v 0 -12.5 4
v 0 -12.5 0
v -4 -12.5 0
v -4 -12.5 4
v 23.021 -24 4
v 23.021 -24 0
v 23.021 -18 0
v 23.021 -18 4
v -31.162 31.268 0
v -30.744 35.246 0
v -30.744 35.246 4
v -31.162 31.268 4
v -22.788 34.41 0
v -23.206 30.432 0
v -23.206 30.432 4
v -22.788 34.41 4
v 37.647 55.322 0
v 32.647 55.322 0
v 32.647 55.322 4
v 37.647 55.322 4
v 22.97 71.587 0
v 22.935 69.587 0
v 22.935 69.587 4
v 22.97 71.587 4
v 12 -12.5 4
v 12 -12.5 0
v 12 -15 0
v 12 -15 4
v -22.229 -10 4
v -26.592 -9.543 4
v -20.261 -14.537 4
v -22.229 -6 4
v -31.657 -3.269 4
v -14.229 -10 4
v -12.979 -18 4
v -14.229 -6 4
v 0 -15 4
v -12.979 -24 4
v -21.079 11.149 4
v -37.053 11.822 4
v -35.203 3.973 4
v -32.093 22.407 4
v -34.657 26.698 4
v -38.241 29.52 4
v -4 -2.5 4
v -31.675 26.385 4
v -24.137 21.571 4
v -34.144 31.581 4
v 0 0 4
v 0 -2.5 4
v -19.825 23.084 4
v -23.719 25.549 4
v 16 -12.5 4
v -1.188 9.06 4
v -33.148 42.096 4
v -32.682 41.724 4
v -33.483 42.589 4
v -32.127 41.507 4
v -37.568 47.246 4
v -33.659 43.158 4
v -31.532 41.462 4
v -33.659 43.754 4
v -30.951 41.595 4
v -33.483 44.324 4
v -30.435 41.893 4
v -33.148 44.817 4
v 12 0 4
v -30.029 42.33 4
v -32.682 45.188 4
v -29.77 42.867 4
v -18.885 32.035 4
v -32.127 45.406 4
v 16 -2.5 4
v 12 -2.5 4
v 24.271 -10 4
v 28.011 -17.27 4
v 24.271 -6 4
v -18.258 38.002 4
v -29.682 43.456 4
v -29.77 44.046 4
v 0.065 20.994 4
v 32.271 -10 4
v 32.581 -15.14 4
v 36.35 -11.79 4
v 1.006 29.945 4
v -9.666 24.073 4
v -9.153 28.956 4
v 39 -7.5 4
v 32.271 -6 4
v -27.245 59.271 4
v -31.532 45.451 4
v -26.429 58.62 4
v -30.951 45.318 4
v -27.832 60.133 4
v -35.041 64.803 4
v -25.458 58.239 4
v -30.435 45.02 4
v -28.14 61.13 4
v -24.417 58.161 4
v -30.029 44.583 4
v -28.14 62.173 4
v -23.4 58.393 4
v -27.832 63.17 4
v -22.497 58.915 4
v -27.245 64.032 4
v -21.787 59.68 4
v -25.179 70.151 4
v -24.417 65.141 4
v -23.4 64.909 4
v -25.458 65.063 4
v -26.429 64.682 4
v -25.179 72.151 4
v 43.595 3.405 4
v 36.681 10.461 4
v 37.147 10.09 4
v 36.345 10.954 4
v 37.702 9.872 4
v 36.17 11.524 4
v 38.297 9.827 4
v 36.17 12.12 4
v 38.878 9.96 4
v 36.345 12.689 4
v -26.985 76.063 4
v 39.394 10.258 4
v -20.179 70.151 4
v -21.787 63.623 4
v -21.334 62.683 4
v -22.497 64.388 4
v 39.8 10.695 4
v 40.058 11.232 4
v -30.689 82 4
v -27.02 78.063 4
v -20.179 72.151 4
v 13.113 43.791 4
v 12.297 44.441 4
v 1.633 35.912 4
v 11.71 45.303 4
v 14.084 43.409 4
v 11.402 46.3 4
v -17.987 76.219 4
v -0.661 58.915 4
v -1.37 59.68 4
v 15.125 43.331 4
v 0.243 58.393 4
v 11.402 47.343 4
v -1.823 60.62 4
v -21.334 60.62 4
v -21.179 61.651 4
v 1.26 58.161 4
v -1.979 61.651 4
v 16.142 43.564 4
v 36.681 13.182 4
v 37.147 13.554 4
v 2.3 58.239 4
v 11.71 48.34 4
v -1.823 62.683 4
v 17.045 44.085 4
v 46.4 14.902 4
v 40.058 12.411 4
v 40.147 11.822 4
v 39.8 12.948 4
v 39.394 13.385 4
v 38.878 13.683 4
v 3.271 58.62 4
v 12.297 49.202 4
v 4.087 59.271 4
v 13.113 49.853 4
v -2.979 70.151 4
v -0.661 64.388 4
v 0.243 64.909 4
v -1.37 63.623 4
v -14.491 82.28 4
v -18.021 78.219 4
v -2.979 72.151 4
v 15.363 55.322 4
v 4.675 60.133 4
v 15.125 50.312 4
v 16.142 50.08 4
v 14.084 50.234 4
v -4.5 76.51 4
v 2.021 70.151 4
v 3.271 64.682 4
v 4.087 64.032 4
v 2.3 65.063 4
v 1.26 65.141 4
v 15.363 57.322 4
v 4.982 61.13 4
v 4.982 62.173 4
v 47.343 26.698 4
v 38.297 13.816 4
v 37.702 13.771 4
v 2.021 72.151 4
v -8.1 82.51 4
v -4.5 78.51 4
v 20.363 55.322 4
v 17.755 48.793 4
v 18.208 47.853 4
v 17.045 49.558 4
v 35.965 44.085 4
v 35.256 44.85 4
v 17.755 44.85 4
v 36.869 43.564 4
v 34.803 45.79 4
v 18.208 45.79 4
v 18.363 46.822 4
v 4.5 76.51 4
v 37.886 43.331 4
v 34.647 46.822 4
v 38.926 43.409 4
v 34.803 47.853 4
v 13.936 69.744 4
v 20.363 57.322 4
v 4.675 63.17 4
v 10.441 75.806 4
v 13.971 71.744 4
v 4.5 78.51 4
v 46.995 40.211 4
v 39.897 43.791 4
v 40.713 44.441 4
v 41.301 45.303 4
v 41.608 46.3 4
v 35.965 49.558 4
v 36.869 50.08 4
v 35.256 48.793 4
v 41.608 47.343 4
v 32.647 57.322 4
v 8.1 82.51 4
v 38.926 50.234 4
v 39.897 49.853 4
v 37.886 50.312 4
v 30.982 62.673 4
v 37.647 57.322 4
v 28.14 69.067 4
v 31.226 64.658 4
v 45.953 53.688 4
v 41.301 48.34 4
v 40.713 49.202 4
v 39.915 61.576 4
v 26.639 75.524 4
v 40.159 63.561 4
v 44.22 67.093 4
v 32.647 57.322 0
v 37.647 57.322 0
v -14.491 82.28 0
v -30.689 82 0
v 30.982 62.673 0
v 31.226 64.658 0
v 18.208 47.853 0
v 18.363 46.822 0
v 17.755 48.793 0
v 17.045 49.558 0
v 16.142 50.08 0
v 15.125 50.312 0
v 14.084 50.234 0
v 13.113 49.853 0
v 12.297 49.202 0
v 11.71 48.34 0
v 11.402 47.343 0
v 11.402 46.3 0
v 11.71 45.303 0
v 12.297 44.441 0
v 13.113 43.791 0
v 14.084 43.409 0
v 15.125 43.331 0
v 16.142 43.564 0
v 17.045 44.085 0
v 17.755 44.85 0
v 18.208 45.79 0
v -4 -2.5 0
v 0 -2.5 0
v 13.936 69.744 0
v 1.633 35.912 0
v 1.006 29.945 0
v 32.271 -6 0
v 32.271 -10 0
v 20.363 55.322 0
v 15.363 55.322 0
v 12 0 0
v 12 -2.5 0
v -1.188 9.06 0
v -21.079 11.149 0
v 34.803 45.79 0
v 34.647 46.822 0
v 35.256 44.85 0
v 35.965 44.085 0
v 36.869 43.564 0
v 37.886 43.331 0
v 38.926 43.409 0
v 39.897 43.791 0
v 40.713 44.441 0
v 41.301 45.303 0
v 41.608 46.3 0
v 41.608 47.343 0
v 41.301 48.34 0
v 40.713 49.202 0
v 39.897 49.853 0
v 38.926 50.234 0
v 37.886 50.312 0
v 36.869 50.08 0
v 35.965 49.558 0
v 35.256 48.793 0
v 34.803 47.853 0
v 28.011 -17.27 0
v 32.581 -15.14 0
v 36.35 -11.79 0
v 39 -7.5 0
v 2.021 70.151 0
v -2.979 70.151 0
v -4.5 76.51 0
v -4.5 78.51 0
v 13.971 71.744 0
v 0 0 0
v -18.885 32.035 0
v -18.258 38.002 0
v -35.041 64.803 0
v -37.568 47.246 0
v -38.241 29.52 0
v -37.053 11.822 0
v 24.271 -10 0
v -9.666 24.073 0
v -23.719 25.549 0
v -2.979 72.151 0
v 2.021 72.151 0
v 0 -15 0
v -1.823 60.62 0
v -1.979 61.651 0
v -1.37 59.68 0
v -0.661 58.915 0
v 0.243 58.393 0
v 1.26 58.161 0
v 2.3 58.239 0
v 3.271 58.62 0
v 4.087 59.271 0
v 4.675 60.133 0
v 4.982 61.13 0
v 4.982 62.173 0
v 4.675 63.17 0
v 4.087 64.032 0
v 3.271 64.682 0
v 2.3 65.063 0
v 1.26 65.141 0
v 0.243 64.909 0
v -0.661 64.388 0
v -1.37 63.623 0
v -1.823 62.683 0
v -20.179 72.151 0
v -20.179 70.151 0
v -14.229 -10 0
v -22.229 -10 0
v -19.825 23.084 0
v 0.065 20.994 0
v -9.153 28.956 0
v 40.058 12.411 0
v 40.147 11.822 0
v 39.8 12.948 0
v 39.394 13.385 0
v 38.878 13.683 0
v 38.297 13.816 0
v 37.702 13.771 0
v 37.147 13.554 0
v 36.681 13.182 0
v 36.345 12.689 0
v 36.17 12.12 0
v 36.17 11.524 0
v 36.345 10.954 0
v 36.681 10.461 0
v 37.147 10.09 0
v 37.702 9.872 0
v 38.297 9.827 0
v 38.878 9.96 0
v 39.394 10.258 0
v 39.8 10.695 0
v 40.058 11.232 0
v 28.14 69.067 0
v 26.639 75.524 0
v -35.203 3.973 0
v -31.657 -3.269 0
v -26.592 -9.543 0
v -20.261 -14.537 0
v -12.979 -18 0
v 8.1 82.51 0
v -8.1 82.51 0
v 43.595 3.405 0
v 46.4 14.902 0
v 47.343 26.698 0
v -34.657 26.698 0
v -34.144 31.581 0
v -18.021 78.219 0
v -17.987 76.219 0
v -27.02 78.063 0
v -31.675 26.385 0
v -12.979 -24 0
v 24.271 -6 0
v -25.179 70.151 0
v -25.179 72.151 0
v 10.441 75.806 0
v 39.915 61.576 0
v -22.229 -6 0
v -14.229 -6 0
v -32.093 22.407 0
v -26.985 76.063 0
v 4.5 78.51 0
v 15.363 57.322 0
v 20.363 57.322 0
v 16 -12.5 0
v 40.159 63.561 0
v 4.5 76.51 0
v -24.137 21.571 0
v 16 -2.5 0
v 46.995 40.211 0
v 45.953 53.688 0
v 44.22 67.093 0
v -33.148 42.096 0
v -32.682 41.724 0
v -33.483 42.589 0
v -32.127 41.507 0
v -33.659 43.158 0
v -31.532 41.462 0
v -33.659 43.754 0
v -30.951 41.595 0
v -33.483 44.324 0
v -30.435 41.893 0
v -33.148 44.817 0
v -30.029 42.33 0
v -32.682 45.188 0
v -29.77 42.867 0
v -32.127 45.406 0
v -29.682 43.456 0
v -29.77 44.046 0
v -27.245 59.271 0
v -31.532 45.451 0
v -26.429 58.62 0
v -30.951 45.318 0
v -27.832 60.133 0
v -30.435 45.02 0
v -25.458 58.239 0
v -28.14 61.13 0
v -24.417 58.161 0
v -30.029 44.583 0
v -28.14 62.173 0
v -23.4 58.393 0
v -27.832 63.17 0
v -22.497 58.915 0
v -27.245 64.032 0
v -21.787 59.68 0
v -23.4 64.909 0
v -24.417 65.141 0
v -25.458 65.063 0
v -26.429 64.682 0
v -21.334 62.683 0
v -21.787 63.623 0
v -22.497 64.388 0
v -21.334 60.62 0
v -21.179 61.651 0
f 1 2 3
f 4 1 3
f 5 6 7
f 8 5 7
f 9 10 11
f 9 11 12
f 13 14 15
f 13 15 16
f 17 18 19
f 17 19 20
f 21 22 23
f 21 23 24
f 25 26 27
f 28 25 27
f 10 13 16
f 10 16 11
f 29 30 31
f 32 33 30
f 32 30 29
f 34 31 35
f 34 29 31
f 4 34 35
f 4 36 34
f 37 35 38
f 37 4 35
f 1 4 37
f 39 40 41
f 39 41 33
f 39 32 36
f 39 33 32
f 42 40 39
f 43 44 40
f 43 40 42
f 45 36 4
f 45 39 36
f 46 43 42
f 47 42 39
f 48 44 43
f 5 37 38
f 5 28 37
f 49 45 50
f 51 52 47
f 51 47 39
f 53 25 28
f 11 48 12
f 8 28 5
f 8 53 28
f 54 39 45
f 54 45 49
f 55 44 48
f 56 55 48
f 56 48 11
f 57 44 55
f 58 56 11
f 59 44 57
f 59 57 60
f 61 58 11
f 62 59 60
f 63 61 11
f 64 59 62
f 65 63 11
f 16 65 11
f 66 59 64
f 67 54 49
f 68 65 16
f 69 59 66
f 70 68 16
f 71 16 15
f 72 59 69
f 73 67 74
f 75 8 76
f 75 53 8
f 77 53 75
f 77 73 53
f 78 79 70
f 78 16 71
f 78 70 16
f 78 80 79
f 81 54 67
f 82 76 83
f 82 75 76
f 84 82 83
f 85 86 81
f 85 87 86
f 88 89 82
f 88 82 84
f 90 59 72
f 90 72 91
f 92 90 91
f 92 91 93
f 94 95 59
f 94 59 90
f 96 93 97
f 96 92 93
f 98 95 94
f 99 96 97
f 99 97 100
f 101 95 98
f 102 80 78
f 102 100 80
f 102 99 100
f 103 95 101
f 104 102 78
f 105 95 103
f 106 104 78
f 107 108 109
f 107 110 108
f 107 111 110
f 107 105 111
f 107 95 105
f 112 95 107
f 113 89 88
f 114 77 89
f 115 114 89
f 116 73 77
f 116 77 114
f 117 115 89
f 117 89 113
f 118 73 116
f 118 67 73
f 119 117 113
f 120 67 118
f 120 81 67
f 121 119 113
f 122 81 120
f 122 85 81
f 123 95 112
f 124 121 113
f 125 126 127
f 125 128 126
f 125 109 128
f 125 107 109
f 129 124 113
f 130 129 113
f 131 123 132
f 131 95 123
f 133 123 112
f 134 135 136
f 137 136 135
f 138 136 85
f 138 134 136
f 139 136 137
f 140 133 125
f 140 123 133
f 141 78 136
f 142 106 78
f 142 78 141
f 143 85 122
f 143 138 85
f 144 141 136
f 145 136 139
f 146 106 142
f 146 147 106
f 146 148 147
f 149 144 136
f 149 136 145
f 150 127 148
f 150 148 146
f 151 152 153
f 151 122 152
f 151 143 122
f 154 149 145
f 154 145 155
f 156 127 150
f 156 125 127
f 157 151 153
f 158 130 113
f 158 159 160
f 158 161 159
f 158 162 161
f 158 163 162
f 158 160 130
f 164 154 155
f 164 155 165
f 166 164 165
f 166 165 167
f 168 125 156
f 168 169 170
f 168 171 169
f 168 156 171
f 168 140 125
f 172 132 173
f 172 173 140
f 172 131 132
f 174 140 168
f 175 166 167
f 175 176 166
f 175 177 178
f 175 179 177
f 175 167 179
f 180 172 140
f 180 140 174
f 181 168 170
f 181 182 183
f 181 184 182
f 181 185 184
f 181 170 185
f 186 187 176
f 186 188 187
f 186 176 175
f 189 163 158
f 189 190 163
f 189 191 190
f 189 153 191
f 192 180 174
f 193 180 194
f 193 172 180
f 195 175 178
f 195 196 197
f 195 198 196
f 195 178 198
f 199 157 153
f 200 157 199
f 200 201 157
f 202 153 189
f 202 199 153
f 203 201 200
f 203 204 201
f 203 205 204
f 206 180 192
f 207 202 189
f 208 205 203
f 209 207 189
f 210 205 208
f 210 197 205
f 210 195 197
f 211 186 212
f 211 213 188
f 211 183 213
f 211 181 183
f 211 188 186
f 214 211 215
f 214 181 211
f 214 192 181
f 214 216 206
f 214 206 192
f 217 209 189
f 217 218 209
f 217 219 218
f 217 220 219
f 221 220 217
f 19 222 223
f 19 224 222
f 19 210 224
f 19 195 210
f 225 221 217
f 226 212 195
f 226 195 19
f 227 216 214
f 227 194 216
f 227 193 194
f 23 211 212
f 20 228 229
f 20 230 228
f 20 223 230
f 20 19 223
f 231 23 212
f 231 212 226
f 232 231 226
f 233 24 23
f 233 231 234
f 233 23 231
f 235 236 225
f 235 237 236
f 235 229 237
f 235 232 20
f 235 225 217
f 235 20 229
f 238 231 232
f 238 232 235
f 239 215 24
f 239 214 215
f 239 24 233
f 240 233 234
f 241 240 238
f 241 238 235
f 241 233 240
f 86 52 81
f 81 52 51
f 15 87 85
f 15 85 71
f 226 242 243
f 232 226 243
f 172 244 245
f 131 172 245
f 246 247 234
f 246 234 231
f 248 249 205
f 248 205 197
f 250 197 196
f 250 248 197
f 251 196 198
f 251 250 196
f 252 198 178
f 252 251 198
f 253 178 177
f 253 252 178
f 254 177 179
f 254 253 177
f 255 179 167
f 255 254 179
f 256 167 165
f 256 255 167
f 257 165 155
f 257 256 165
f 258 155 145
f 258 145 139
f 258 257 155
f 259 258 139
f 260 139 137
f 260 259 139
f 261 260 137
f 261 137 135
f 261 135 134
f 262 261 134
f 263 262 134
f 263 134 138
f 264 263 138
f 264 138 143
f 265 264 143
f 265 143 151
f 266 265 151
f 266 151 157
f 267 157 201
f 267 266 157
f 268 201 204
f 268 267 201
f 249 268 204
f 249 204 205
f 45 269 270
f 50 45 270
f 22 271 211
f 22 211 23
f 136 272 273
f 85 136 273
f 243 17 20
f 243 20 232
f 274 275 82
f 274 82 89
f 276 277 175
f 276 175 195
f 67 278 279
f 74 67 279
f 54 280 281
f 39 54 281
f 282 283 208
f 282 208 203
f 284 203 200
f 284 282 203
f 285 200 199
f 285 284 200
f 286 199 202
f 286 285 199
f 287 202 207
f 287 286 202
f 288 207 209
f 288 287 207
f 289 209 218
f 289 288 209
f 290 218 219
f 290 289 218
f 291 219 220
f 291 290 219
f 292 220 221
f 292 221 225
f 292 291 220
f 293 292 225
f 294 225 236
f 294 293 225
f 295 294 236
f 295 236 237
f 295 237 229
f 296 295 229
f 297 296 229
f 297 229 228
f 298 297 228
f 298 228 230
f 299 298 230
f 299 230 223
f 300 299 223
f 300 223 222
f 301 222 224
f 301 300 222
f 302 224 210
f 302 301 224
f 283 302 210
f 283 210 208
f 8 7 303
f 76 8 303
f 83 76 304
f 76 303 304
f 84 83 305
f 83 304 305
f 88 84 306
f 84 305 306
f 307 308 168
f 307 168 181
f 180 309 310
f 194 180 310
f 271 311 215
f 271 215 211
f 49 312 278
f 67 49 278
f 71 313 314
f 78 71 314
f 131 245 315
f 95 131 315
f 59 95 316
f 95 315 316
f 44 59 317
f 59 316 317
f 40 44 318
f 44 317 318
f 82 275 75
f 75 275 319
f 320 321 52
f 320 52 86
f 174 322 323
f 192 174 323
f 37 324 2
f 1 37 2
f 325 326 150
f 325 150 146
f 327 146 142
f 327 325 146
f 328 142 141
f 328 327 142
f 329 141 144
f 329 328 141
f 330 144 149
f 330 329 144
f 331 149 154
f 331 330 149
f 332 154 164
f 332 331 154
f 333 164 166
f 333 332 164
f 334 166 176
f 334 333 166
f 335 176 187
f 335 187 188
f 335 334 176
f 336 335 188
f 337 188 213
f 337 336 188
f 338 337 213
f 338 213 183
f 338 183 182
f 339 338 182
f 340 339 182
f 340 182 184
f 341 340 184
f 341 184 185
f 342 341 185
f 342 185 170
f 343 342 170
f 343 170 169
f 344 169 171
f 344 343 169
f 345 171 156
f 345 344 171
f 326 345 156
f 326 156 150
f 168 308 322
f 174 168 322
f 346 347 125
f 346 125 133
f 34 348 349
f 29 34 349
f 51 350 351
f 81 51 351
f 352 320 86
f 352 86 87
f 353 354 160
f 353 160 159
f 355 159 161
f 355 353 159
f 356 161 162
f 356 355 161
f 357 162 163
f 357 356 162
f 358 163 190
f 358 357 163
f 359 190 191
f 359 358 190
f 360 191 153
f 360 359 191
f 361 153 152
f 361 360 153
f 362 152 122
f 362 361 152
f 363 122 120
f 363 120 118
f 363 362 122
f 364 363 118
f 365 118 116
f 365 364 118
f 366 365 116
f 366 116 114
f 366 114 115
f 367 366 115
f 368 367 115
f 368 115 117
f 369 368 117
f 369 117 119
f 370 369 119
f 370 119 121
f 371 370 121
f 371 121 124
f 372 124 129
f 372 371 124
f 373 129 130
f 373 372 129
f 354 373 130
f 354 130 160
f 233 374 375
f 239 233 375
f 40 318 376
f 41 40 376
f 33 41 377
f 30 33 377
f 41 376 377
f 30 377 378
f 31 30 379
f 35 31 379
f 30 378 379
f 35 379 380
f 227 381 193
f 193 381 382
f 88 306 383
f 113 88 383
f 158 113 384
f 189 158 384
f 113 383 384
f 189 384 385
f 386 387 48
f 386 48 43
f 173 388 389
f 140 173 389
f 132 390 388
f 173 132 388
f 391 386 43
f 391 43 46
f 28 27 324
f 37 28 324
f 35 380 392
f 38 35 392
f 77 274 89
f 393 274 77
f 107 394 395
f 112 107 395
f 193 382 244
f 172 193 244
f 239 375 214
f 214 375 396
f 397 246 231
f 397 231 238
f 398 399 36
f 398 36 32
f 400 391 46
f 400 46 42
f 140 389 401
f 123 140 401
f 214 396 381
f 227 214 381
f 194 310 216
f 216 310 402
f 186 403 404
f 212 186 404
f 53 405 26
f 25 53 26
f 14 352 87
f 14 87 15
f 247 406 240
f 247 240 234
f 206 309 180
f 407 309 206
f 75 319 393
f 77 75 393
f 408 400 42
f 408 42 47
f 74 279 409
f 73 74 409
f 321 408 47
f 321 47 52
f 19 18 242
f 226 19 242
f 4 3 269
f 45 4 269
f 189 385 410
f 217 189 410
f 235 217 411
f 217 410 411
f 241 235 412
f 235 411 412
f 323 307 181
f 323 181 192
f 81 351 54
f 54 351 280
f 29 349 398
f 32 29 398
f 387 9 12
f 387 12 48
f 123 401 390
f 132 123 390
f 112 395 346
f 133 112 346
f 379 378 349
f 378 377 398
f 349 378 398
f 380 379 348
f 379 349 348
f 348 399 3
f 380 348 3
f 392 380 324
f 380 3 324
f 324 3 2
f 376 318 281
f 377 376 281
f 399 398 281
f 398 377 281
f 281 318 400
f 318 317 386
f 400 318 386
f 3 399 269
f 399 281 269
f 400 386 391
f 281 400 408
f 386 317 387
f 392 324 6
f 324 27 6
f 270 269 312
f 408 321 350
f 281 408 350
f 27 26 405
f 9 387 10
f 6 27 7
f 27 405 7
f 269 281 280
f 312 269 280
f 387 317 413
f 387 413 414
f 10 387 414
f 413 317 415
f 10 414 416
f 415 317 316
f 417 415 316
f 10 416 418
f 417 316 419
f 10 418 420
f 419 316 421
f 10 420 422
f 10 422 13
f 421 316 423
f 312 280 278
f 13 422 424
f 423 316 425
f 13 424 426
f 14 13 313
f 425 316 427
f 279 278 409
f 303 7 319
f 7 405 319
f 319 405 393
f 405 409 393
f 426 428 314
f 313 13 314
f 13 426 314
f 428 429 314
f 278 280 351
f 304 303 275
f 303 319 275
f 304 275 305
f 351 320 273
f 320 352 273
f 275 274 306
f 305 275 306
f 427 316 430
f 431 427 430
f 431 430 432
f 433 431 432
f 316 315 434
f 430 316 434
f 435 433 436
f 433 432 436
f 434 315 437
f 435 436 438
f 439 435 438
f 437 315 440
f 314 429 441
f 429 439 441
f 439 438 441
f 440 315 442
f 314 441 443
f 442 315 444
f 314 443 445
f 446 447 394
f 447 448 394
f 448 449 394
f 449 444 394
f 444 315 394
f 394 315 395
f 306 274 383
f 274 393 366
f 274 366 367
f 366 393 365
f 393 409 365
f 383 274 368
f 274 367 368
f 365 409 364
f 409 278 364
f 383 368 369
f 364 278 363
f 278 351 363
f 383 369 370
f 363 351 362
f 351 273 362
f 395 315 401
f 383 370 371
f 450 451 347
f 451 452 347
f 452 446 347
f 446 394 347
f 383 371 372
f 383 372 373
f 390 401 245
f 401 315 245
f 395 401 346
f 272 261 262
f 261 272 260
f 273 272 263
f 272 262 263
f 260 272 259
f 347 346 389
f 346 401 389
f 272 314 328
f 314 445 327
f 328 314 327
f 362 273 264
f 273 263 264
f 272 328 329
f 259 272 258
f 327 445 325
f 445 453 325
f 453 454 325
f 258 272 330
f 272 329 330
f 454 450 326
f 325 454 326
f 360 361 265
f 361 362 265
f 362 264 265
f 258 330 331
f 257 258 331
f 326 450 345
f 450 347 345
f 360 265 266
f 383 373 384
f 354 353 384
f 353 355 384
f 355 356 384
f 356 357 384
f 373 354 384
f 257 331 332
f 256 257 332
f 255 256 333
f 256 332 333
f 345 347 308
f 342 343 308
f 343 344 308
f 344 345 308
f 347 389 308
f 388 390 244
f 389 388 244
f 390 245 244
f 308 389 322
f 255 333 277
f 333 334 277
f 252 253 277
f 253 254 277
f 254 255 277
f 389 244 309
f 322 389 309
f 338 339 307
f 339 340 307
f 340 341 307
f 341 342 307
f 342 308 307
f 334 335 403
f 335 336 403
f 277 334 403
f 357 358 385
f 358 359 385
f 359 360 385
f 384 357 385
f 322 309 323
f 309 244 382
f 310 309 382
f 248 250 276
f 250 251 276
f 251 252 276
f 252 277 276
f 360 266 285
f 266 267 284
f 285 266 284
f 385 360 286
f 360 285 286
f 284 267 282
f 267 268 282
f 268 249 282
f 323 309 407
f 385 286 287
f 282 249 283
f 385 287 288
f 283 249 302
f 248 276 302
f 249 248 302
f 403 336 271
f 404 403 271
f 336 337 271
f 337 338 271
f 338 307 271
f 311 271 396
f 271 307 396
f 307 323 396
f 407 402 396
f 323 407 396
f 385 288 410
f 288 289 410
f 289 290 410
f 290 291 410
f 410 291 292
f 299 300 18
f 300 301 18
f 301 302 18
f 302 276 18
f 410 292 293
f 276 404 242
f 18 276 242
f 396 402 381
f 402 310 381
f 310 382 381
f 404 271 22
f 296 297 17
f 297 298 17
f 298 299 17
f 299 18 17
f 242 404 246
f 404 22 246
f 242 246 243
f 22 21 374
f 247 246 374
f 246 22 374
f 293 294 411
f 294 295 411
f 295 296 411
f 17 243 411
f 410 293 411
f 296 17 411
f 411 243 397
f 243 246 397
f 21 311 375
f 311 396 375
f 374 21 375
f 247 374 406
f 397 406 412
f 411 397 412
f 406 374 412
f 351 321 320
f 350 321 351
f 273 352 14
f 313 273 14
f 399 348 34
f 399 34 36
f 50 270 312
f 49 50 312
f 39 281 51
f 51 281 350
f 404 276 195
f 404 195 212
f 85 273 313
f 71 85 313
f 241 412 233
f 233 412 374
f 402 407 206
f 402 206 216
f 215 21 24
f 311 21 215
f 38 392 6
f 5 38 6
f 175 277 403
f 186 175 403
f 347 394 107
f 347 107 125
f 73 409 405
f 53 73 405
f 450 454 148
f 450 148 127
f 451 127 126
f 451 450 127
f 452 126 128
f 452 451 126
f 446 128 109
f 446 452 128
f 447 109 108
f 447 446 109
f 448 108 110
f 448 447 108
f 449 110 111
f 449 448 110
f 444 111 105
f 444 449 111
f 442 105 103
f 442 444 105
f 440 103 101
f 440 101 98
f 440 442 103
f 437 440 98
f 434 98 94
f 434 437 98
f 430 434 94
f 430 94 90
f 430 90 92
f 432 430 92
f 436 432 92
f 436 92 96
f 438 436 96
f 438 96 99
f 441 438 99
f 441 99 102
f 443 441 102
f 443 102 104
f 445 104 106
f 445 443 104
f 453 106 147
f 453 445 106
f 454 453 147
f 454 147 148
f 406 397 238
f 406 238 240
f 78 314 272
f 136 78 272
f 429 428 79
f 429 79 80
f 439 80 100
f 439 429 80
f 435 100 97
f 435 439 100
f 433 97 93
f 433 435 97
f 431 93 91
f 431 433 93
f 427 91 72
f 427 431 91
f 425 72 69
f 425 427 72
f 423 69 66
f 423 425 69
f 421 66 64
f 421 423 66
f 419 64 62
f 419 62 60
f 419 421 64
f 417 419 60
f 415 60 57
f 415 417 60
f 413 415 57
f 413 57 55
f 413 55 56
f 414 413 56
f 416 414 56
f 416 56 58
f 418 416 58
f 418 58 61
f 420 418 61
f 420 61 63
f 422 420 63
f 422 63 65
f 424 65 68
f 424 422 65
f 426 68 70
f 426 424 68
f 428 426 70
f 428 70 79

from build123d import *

# Parameters (mm, degrees)
SKETCH1_R           = 2
SKETCH1_R_2         = 3.5
SKETCH1_W           = 9.000072
SKETCH1_H           = 2
SKETCH1_W_2         = 5
BOSS_EXTRUDE1_DEPTH = 4
SKETCH2_W           = 8
SKETCH2_H           = 4
CUT_EXTRUDE1_DEPTH  = 96.21167482


with BuildPart() as part:
    # Sketch1 → Boss-Extrude1 (new body)
    with BuildSketch(Plane.XY):
        with BuildLine():
            Line((-12.978640908, -18), (-12.978640908, -24))
            Line((-12.978640908, -24), (23.021359092, -24))
            Line((23.021359092, -24), (23.021359092, -18))
            ThreePointArc((23.021359092, -18), (32.58126188, -15.140073441), (39, -7.5))
            ThreePointArc((39, -7.5), (45.227131985, 9.097629123), (47.343034567, 26.698237678))
            ThreePointArc((47.343034567, 26.698237678), (46.561018226, 46.955835458), (44.219623828, 67.092858318))
            Line((44.219623828, 67.092858318), (28.140376172, 69.067141682))
            Line((28.140376172, 69.067141682), (26.638766331, 75.523635508))
            Line((26.638766331, 75.523635508), (10.441233669, 75.806364492))
            Line((10.441233669, 75.806364492), (8.1, 82.51))
            Line((8.1, 82.51), (-8.1, 82.51))
            Line((-8.1, 82.51), (-14.491217975, 82.280462515))
            Line((-14.491217975, 82.280462515), (-30.688782025, 81.999537485))
            ThreePointArc((-30.688782025, 81.999537485), (-37.567707395, 47.245827753), (-37.052658257, 11.821617405))
            ThreePointArc((-37.052658257, 11.821617405), (-29.300451665, -6.548172019), (-12.978640908, -18))
        make_face()
        with Locations((38.147341743, 11.821617405)):
            Circle(SKETCH1_R, mode=Mode.SUBTRACT)
        with Locations((-24.678960076, 61.651218734)):
            Circle(SKETCH1_R_2, mode=Mode.SUBTRACT)
        with Locations((1.521420673, 61.651218734)):
            Circle(SKETCH1_R_2, mode=Mode.SUBTRACT)
        with Locations((14.86306514, 46.821617405)):
            Circle(SKETCH1_R_2, mode=Mode.SUBTRACT)
        with Locations((38.147341743, 46.821617405)):
            Circle(SKETCH1_R_2, mode=Mode.SUBTRACT)
        with Locations((-31.681501662, 43.456405989)):
            Circle(SKETCH1_R, mode=Mode.SUBTRACT)
        with Locations((0, 77.51)):
            Rectangle(SKETCH1_W, SKETCH1_H, mode=Mode.SUBTRACT)
        Polygon((-4, -2.5), (0, -2.5), (0, 0), (12, 0), (12, -2.5), (16, -2.5), (16, -12.5), (12, -12.5), (12, -15), (0, -15), (0, -12.5), (-4, -12.5), align=None, mode=Mode.SUBTRACT)
        with Locations((35.147341743, 56.321617405)):
            Rectangle(SKETCH1_W_2, SKETCH1_H, mode=Mode.SUBTRACT)
        Polygon((-27.019995137, 78.062566115), (-18.021276454, 78.218636824), (-17.986594351, 76.218937559), (-26.985313034, 76.062866849), align=None, mode=Mode.SUBTRACT)
        with Locations((17.86306514, 56.321617405)):
            Rectangle(SKETCH1_W_2, SKETCH1_H, mode=Mode.SUBTRACT)
        with Locations((-0.478579327, 71.151218734)):
            Rectangle(SKETCH1_W_2, SKETCH1_H, mode=Mode.SUBTRACT)
        Polygon((13.970839752, 71.744145677), (13.935934939, 69.744450286), (22.934636184, 69.587377372), (22.969540997, 71.587072762), align=None, mode=Mode.SUBTRACT)
        Polygon((40.15901604, 63.561398961), (31.226029212, 64.658231826), (30.982290526, 62.673139523), (39.915277354, 61.576306658), align=None, mode=Mode.SUBTRACT)
        Polygon((1.632632483, 35.912105076), (1.005748572, 29.944943559), (-18.884789816, 32.034556594), (-18.257905905, 38.00171811), align=None, mode=Mode.SUBTRACT)
        with Locations((-22.678960076, 71.151218734)):
            Rectangle(SKETCH1_W_2, SKETCH1_H, mode=Mode.SUBTRACT)
        Polygon((0.065422707, 20.994201285), (-1.188345114, 9.059878252), (-21.078883502, 11.149491286), (-19.825115681, 23.083814319), align=None, mode=Mode.SUBTRACT)
        Polygon((-9.666, 24.072796069), (-9.153, 28.955923243), (-23.205665371, 30.432234852), (-22.787742764, 34.410342529), (-30.743958119, 35.246187743), (-31.161880726, 31.268080066), (-34.143965433, 31.581364852), (-34.656965433, 26.698237678), (-31.674880726, 26.384952891), (-32.092803333, 22.406845214), (-24.136587978, 21.571), (-23.718665371, 25.549107678), align=None, mode=Mode.SUBTRACT)
    extrude(amount=BOSS_EXTRUDE1_DEPTH)

    # Sketch2 → Cut-Extrude1 (cut, through all)
    with BuildSketch(Plane(origin=(0, 0, 0), x_dir=(-1, 0, 0), z_dir=(0, 0, -1))):
        with Locations((-28.271359092, -8)):
            Rectangle(SKETCH2_W, SKETCH2_H)
        with Locations((18.228640908, -8)):
            Rectangle(SKETCH2_W, SKETCH2_H)
    extrude(amount=-CUT_EXTRUDE1_DEPTH, mode=Mode.SUBTRACT)


solid = part.part
